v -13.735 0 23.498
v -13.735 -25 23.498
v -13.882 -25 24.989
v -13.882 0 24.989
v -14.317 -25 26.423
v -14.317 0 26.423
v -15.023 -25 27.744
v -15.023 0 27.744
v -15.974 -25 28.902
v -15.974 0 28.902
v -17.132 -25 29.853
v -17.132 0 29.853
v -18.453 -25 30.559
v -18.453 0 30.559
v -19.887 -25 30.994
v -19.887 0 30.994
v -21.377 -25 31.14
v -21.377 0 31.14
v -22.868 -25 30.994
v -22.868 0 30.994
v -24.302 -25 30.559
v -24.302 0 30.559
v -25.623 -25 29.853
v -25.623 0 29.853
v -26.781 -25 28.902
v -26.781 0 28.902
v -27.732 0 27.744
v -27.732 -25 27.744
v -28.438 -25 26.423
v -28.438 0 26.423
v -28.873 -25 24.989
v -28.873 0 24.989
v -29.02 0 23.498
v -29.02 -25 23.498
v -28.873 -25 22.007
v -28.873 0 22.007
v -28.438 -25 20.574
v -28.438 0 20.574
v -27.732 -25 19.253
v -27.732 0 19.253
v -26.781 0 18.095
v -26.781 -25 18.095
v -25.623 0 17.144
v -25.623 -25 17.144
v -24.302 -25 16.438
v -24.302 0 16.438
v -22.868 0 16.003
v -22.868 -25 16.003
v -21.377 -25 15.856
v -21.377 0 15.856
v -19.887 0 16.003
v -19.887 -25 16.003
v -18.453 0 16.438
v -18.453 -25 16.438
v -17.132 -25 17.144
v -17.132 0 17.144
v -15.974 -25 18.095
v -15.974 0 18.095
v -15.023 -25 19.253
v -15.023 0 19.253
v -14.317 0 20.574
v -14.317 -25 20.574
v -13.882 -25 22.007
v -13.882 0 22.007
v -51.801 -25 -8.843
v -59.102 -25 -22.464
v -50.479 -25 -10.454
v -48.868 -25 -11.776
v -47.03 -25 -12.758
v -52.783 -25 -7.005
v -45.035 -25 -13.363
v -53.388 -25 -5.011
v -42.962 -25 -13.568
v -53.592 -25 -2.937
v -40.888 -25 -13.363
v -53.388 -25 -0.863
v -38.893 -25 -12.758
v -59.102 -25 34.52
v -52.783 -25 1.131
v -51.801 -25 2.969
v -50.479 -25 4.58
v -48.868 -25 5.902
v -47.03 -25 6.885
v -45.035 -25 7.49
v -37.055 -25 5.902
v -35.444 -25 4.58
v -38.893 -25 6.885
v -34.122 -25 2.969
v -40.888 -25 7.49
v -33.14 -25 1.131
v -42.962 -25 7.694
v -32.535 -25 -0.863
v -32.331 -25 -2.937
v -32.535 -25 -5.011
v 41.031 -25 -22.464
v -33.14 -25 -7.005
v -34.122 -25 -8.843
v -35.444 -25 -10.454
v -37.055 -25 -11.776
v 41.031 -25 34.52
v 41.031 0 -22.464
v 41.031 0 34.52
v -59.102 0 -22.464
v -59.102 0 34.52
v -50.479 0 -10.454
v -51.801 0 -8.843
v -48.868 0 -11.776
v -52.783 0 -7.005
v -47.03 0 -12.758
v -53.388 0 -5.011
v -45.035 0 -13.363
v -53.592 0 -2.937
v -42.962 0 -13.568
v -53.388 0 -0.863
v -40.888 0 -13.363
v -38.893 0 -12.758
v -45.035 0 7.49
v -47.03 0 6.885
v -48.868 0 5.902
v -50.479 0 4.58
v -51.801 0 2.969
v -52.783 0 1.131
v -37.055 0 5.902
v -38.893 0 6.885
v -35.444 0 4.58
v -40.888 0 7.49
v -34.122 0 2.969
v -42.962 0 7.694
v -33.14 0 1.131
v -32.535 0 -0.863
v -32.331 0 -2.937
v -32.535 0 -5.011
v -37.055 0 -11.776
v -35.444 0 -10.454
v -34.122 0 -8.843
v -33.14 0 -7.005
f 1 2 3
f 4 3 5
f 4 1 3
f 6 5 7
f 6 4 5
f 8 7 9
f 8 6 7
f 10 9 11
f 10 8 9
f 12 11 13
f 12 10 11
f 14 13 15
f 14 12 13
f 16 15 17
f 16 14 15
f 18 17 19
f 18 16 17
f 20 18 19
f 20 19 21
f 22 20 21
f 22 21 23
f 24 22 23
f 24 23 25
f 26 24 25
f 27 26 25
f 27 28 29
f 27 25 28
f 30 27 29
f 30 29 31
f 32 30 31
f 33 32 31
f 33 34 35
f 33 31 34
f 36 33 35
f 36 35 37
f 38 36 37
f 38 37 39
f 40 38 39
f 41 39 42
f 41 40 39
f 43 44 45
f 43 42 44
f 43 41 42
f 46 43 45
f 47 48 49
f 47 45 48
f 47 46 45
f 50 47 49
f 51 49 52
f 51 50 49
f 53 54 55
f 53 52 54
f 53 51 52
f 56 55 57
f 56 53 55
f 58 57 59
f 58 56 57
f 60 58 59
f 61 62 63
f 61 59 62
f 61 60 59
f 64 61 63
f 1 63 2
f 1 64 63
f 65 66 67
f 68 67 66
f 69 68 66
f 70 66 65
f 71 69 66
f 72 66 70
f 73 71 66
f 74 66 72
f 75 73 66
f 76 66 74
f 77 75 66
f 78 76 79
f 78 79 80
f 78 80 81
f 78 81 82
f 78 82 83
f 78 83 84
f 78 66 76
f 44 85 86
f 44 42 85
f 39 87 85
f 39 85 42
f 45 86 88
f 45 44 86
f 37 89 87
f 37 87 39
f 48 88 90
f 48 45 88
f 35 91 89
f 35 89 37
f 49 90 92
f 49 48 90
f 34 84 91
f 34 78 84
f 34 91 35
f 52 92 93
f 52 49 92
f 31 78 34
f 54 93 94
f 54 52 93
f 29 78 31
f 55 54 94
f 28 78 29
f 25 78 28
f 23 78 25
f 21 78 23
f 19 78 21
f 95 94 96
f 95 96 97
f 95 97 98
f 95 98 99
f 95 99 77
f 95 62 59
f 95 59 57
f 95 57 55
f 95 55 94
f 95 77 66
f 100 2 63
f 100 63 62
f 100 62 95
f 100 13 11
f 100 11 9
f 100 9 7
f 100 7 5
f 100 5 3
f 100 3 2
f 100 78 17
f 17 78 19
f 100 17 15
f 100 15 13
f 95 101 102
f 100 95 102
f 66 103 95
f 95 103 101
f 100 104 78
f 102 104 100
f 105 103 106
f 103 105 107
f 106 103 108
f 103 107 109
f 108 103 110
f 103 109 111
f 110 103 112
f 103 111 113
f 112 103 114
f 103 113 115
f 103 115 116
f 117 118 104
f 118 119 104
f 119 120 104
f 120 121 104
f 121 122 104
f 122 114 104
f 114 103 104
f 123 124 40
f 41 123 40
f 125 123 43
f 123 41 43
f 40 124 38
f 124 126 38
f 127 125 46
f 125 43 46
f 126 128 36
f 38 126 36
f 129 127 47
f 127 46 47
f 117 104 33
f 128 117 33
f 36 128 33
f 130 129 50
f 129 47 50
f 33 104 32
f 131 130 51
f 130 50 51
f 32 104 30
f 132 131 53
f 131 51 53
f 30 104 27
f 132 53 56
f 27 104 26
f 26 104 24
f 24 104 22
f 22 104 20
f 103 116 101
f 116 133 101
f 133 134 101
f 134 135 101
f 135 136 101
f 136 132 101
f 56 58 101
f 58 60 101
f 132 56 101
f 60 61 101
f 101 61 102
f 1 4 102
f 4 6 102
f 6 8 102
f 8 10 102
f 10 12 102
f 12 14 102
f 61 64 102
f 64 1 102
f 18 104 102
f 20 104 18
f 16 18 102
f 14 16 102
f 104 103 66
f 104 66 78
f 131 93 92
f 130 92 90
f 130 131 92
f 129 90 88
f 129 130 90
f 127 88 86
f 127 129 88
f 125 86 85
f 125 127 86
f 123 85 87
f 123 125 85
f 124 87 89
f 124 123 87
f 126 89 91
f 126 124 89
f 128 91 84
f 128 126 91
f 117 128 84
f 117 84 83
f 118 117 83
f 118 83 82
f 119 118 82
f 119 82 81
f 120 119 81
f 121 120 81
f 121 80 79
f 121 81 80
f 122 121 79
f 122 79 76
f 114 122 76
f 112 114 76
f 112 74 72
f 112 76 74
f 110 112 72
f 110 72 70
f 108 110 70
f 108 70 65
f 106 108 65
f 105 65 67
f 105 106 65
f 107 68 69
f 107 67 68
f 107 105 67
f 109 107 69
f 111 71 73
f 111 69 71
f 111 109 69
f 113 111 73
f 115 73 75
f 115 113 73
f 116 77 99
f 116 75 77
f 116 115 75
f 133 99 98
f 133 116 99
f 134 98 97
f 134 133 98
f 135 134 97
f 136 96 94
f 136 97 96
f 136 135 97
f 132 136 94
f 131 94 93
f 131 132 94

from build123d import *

# Parameters (mm, degrees)
F0_W     = 100.13302
F0_H     = 56.984361
F1_DEPTH = 25
F2_R     = 7.642085
F3_DEPTH = 120.5
F4_R     = 10.630728
F5_DEPTH = 179


with BuildPart() as f1:
    # F0 (on Front) → F1 (new body)
    with BuildSketch(Plane.XZ):
        with Locations((-9.035291, 6.027846)):
            Rectangle(F0_W, F0_H)
    extrude(amount=F1_DEPTH)

    # F2 (on Front) → F3 (cut)
    with BuildSketch(Plane.XZ):
        with Locations((-21.377444, 23.498362)):
            Circle(F2_R)
    extrude(amount=F3_DEPTH, mode=Mode.SUBTRACT)

    # F4 (on Front) → F5 (cut)
    with BuildSketch(Plane.XZ):
        with Locations((-42.96153, -2.936909)):
            Circle(F4_R)
    extrude(amount=F5_DEPTH, mode=Mode.SUBTRACT)


solid = f1.part
